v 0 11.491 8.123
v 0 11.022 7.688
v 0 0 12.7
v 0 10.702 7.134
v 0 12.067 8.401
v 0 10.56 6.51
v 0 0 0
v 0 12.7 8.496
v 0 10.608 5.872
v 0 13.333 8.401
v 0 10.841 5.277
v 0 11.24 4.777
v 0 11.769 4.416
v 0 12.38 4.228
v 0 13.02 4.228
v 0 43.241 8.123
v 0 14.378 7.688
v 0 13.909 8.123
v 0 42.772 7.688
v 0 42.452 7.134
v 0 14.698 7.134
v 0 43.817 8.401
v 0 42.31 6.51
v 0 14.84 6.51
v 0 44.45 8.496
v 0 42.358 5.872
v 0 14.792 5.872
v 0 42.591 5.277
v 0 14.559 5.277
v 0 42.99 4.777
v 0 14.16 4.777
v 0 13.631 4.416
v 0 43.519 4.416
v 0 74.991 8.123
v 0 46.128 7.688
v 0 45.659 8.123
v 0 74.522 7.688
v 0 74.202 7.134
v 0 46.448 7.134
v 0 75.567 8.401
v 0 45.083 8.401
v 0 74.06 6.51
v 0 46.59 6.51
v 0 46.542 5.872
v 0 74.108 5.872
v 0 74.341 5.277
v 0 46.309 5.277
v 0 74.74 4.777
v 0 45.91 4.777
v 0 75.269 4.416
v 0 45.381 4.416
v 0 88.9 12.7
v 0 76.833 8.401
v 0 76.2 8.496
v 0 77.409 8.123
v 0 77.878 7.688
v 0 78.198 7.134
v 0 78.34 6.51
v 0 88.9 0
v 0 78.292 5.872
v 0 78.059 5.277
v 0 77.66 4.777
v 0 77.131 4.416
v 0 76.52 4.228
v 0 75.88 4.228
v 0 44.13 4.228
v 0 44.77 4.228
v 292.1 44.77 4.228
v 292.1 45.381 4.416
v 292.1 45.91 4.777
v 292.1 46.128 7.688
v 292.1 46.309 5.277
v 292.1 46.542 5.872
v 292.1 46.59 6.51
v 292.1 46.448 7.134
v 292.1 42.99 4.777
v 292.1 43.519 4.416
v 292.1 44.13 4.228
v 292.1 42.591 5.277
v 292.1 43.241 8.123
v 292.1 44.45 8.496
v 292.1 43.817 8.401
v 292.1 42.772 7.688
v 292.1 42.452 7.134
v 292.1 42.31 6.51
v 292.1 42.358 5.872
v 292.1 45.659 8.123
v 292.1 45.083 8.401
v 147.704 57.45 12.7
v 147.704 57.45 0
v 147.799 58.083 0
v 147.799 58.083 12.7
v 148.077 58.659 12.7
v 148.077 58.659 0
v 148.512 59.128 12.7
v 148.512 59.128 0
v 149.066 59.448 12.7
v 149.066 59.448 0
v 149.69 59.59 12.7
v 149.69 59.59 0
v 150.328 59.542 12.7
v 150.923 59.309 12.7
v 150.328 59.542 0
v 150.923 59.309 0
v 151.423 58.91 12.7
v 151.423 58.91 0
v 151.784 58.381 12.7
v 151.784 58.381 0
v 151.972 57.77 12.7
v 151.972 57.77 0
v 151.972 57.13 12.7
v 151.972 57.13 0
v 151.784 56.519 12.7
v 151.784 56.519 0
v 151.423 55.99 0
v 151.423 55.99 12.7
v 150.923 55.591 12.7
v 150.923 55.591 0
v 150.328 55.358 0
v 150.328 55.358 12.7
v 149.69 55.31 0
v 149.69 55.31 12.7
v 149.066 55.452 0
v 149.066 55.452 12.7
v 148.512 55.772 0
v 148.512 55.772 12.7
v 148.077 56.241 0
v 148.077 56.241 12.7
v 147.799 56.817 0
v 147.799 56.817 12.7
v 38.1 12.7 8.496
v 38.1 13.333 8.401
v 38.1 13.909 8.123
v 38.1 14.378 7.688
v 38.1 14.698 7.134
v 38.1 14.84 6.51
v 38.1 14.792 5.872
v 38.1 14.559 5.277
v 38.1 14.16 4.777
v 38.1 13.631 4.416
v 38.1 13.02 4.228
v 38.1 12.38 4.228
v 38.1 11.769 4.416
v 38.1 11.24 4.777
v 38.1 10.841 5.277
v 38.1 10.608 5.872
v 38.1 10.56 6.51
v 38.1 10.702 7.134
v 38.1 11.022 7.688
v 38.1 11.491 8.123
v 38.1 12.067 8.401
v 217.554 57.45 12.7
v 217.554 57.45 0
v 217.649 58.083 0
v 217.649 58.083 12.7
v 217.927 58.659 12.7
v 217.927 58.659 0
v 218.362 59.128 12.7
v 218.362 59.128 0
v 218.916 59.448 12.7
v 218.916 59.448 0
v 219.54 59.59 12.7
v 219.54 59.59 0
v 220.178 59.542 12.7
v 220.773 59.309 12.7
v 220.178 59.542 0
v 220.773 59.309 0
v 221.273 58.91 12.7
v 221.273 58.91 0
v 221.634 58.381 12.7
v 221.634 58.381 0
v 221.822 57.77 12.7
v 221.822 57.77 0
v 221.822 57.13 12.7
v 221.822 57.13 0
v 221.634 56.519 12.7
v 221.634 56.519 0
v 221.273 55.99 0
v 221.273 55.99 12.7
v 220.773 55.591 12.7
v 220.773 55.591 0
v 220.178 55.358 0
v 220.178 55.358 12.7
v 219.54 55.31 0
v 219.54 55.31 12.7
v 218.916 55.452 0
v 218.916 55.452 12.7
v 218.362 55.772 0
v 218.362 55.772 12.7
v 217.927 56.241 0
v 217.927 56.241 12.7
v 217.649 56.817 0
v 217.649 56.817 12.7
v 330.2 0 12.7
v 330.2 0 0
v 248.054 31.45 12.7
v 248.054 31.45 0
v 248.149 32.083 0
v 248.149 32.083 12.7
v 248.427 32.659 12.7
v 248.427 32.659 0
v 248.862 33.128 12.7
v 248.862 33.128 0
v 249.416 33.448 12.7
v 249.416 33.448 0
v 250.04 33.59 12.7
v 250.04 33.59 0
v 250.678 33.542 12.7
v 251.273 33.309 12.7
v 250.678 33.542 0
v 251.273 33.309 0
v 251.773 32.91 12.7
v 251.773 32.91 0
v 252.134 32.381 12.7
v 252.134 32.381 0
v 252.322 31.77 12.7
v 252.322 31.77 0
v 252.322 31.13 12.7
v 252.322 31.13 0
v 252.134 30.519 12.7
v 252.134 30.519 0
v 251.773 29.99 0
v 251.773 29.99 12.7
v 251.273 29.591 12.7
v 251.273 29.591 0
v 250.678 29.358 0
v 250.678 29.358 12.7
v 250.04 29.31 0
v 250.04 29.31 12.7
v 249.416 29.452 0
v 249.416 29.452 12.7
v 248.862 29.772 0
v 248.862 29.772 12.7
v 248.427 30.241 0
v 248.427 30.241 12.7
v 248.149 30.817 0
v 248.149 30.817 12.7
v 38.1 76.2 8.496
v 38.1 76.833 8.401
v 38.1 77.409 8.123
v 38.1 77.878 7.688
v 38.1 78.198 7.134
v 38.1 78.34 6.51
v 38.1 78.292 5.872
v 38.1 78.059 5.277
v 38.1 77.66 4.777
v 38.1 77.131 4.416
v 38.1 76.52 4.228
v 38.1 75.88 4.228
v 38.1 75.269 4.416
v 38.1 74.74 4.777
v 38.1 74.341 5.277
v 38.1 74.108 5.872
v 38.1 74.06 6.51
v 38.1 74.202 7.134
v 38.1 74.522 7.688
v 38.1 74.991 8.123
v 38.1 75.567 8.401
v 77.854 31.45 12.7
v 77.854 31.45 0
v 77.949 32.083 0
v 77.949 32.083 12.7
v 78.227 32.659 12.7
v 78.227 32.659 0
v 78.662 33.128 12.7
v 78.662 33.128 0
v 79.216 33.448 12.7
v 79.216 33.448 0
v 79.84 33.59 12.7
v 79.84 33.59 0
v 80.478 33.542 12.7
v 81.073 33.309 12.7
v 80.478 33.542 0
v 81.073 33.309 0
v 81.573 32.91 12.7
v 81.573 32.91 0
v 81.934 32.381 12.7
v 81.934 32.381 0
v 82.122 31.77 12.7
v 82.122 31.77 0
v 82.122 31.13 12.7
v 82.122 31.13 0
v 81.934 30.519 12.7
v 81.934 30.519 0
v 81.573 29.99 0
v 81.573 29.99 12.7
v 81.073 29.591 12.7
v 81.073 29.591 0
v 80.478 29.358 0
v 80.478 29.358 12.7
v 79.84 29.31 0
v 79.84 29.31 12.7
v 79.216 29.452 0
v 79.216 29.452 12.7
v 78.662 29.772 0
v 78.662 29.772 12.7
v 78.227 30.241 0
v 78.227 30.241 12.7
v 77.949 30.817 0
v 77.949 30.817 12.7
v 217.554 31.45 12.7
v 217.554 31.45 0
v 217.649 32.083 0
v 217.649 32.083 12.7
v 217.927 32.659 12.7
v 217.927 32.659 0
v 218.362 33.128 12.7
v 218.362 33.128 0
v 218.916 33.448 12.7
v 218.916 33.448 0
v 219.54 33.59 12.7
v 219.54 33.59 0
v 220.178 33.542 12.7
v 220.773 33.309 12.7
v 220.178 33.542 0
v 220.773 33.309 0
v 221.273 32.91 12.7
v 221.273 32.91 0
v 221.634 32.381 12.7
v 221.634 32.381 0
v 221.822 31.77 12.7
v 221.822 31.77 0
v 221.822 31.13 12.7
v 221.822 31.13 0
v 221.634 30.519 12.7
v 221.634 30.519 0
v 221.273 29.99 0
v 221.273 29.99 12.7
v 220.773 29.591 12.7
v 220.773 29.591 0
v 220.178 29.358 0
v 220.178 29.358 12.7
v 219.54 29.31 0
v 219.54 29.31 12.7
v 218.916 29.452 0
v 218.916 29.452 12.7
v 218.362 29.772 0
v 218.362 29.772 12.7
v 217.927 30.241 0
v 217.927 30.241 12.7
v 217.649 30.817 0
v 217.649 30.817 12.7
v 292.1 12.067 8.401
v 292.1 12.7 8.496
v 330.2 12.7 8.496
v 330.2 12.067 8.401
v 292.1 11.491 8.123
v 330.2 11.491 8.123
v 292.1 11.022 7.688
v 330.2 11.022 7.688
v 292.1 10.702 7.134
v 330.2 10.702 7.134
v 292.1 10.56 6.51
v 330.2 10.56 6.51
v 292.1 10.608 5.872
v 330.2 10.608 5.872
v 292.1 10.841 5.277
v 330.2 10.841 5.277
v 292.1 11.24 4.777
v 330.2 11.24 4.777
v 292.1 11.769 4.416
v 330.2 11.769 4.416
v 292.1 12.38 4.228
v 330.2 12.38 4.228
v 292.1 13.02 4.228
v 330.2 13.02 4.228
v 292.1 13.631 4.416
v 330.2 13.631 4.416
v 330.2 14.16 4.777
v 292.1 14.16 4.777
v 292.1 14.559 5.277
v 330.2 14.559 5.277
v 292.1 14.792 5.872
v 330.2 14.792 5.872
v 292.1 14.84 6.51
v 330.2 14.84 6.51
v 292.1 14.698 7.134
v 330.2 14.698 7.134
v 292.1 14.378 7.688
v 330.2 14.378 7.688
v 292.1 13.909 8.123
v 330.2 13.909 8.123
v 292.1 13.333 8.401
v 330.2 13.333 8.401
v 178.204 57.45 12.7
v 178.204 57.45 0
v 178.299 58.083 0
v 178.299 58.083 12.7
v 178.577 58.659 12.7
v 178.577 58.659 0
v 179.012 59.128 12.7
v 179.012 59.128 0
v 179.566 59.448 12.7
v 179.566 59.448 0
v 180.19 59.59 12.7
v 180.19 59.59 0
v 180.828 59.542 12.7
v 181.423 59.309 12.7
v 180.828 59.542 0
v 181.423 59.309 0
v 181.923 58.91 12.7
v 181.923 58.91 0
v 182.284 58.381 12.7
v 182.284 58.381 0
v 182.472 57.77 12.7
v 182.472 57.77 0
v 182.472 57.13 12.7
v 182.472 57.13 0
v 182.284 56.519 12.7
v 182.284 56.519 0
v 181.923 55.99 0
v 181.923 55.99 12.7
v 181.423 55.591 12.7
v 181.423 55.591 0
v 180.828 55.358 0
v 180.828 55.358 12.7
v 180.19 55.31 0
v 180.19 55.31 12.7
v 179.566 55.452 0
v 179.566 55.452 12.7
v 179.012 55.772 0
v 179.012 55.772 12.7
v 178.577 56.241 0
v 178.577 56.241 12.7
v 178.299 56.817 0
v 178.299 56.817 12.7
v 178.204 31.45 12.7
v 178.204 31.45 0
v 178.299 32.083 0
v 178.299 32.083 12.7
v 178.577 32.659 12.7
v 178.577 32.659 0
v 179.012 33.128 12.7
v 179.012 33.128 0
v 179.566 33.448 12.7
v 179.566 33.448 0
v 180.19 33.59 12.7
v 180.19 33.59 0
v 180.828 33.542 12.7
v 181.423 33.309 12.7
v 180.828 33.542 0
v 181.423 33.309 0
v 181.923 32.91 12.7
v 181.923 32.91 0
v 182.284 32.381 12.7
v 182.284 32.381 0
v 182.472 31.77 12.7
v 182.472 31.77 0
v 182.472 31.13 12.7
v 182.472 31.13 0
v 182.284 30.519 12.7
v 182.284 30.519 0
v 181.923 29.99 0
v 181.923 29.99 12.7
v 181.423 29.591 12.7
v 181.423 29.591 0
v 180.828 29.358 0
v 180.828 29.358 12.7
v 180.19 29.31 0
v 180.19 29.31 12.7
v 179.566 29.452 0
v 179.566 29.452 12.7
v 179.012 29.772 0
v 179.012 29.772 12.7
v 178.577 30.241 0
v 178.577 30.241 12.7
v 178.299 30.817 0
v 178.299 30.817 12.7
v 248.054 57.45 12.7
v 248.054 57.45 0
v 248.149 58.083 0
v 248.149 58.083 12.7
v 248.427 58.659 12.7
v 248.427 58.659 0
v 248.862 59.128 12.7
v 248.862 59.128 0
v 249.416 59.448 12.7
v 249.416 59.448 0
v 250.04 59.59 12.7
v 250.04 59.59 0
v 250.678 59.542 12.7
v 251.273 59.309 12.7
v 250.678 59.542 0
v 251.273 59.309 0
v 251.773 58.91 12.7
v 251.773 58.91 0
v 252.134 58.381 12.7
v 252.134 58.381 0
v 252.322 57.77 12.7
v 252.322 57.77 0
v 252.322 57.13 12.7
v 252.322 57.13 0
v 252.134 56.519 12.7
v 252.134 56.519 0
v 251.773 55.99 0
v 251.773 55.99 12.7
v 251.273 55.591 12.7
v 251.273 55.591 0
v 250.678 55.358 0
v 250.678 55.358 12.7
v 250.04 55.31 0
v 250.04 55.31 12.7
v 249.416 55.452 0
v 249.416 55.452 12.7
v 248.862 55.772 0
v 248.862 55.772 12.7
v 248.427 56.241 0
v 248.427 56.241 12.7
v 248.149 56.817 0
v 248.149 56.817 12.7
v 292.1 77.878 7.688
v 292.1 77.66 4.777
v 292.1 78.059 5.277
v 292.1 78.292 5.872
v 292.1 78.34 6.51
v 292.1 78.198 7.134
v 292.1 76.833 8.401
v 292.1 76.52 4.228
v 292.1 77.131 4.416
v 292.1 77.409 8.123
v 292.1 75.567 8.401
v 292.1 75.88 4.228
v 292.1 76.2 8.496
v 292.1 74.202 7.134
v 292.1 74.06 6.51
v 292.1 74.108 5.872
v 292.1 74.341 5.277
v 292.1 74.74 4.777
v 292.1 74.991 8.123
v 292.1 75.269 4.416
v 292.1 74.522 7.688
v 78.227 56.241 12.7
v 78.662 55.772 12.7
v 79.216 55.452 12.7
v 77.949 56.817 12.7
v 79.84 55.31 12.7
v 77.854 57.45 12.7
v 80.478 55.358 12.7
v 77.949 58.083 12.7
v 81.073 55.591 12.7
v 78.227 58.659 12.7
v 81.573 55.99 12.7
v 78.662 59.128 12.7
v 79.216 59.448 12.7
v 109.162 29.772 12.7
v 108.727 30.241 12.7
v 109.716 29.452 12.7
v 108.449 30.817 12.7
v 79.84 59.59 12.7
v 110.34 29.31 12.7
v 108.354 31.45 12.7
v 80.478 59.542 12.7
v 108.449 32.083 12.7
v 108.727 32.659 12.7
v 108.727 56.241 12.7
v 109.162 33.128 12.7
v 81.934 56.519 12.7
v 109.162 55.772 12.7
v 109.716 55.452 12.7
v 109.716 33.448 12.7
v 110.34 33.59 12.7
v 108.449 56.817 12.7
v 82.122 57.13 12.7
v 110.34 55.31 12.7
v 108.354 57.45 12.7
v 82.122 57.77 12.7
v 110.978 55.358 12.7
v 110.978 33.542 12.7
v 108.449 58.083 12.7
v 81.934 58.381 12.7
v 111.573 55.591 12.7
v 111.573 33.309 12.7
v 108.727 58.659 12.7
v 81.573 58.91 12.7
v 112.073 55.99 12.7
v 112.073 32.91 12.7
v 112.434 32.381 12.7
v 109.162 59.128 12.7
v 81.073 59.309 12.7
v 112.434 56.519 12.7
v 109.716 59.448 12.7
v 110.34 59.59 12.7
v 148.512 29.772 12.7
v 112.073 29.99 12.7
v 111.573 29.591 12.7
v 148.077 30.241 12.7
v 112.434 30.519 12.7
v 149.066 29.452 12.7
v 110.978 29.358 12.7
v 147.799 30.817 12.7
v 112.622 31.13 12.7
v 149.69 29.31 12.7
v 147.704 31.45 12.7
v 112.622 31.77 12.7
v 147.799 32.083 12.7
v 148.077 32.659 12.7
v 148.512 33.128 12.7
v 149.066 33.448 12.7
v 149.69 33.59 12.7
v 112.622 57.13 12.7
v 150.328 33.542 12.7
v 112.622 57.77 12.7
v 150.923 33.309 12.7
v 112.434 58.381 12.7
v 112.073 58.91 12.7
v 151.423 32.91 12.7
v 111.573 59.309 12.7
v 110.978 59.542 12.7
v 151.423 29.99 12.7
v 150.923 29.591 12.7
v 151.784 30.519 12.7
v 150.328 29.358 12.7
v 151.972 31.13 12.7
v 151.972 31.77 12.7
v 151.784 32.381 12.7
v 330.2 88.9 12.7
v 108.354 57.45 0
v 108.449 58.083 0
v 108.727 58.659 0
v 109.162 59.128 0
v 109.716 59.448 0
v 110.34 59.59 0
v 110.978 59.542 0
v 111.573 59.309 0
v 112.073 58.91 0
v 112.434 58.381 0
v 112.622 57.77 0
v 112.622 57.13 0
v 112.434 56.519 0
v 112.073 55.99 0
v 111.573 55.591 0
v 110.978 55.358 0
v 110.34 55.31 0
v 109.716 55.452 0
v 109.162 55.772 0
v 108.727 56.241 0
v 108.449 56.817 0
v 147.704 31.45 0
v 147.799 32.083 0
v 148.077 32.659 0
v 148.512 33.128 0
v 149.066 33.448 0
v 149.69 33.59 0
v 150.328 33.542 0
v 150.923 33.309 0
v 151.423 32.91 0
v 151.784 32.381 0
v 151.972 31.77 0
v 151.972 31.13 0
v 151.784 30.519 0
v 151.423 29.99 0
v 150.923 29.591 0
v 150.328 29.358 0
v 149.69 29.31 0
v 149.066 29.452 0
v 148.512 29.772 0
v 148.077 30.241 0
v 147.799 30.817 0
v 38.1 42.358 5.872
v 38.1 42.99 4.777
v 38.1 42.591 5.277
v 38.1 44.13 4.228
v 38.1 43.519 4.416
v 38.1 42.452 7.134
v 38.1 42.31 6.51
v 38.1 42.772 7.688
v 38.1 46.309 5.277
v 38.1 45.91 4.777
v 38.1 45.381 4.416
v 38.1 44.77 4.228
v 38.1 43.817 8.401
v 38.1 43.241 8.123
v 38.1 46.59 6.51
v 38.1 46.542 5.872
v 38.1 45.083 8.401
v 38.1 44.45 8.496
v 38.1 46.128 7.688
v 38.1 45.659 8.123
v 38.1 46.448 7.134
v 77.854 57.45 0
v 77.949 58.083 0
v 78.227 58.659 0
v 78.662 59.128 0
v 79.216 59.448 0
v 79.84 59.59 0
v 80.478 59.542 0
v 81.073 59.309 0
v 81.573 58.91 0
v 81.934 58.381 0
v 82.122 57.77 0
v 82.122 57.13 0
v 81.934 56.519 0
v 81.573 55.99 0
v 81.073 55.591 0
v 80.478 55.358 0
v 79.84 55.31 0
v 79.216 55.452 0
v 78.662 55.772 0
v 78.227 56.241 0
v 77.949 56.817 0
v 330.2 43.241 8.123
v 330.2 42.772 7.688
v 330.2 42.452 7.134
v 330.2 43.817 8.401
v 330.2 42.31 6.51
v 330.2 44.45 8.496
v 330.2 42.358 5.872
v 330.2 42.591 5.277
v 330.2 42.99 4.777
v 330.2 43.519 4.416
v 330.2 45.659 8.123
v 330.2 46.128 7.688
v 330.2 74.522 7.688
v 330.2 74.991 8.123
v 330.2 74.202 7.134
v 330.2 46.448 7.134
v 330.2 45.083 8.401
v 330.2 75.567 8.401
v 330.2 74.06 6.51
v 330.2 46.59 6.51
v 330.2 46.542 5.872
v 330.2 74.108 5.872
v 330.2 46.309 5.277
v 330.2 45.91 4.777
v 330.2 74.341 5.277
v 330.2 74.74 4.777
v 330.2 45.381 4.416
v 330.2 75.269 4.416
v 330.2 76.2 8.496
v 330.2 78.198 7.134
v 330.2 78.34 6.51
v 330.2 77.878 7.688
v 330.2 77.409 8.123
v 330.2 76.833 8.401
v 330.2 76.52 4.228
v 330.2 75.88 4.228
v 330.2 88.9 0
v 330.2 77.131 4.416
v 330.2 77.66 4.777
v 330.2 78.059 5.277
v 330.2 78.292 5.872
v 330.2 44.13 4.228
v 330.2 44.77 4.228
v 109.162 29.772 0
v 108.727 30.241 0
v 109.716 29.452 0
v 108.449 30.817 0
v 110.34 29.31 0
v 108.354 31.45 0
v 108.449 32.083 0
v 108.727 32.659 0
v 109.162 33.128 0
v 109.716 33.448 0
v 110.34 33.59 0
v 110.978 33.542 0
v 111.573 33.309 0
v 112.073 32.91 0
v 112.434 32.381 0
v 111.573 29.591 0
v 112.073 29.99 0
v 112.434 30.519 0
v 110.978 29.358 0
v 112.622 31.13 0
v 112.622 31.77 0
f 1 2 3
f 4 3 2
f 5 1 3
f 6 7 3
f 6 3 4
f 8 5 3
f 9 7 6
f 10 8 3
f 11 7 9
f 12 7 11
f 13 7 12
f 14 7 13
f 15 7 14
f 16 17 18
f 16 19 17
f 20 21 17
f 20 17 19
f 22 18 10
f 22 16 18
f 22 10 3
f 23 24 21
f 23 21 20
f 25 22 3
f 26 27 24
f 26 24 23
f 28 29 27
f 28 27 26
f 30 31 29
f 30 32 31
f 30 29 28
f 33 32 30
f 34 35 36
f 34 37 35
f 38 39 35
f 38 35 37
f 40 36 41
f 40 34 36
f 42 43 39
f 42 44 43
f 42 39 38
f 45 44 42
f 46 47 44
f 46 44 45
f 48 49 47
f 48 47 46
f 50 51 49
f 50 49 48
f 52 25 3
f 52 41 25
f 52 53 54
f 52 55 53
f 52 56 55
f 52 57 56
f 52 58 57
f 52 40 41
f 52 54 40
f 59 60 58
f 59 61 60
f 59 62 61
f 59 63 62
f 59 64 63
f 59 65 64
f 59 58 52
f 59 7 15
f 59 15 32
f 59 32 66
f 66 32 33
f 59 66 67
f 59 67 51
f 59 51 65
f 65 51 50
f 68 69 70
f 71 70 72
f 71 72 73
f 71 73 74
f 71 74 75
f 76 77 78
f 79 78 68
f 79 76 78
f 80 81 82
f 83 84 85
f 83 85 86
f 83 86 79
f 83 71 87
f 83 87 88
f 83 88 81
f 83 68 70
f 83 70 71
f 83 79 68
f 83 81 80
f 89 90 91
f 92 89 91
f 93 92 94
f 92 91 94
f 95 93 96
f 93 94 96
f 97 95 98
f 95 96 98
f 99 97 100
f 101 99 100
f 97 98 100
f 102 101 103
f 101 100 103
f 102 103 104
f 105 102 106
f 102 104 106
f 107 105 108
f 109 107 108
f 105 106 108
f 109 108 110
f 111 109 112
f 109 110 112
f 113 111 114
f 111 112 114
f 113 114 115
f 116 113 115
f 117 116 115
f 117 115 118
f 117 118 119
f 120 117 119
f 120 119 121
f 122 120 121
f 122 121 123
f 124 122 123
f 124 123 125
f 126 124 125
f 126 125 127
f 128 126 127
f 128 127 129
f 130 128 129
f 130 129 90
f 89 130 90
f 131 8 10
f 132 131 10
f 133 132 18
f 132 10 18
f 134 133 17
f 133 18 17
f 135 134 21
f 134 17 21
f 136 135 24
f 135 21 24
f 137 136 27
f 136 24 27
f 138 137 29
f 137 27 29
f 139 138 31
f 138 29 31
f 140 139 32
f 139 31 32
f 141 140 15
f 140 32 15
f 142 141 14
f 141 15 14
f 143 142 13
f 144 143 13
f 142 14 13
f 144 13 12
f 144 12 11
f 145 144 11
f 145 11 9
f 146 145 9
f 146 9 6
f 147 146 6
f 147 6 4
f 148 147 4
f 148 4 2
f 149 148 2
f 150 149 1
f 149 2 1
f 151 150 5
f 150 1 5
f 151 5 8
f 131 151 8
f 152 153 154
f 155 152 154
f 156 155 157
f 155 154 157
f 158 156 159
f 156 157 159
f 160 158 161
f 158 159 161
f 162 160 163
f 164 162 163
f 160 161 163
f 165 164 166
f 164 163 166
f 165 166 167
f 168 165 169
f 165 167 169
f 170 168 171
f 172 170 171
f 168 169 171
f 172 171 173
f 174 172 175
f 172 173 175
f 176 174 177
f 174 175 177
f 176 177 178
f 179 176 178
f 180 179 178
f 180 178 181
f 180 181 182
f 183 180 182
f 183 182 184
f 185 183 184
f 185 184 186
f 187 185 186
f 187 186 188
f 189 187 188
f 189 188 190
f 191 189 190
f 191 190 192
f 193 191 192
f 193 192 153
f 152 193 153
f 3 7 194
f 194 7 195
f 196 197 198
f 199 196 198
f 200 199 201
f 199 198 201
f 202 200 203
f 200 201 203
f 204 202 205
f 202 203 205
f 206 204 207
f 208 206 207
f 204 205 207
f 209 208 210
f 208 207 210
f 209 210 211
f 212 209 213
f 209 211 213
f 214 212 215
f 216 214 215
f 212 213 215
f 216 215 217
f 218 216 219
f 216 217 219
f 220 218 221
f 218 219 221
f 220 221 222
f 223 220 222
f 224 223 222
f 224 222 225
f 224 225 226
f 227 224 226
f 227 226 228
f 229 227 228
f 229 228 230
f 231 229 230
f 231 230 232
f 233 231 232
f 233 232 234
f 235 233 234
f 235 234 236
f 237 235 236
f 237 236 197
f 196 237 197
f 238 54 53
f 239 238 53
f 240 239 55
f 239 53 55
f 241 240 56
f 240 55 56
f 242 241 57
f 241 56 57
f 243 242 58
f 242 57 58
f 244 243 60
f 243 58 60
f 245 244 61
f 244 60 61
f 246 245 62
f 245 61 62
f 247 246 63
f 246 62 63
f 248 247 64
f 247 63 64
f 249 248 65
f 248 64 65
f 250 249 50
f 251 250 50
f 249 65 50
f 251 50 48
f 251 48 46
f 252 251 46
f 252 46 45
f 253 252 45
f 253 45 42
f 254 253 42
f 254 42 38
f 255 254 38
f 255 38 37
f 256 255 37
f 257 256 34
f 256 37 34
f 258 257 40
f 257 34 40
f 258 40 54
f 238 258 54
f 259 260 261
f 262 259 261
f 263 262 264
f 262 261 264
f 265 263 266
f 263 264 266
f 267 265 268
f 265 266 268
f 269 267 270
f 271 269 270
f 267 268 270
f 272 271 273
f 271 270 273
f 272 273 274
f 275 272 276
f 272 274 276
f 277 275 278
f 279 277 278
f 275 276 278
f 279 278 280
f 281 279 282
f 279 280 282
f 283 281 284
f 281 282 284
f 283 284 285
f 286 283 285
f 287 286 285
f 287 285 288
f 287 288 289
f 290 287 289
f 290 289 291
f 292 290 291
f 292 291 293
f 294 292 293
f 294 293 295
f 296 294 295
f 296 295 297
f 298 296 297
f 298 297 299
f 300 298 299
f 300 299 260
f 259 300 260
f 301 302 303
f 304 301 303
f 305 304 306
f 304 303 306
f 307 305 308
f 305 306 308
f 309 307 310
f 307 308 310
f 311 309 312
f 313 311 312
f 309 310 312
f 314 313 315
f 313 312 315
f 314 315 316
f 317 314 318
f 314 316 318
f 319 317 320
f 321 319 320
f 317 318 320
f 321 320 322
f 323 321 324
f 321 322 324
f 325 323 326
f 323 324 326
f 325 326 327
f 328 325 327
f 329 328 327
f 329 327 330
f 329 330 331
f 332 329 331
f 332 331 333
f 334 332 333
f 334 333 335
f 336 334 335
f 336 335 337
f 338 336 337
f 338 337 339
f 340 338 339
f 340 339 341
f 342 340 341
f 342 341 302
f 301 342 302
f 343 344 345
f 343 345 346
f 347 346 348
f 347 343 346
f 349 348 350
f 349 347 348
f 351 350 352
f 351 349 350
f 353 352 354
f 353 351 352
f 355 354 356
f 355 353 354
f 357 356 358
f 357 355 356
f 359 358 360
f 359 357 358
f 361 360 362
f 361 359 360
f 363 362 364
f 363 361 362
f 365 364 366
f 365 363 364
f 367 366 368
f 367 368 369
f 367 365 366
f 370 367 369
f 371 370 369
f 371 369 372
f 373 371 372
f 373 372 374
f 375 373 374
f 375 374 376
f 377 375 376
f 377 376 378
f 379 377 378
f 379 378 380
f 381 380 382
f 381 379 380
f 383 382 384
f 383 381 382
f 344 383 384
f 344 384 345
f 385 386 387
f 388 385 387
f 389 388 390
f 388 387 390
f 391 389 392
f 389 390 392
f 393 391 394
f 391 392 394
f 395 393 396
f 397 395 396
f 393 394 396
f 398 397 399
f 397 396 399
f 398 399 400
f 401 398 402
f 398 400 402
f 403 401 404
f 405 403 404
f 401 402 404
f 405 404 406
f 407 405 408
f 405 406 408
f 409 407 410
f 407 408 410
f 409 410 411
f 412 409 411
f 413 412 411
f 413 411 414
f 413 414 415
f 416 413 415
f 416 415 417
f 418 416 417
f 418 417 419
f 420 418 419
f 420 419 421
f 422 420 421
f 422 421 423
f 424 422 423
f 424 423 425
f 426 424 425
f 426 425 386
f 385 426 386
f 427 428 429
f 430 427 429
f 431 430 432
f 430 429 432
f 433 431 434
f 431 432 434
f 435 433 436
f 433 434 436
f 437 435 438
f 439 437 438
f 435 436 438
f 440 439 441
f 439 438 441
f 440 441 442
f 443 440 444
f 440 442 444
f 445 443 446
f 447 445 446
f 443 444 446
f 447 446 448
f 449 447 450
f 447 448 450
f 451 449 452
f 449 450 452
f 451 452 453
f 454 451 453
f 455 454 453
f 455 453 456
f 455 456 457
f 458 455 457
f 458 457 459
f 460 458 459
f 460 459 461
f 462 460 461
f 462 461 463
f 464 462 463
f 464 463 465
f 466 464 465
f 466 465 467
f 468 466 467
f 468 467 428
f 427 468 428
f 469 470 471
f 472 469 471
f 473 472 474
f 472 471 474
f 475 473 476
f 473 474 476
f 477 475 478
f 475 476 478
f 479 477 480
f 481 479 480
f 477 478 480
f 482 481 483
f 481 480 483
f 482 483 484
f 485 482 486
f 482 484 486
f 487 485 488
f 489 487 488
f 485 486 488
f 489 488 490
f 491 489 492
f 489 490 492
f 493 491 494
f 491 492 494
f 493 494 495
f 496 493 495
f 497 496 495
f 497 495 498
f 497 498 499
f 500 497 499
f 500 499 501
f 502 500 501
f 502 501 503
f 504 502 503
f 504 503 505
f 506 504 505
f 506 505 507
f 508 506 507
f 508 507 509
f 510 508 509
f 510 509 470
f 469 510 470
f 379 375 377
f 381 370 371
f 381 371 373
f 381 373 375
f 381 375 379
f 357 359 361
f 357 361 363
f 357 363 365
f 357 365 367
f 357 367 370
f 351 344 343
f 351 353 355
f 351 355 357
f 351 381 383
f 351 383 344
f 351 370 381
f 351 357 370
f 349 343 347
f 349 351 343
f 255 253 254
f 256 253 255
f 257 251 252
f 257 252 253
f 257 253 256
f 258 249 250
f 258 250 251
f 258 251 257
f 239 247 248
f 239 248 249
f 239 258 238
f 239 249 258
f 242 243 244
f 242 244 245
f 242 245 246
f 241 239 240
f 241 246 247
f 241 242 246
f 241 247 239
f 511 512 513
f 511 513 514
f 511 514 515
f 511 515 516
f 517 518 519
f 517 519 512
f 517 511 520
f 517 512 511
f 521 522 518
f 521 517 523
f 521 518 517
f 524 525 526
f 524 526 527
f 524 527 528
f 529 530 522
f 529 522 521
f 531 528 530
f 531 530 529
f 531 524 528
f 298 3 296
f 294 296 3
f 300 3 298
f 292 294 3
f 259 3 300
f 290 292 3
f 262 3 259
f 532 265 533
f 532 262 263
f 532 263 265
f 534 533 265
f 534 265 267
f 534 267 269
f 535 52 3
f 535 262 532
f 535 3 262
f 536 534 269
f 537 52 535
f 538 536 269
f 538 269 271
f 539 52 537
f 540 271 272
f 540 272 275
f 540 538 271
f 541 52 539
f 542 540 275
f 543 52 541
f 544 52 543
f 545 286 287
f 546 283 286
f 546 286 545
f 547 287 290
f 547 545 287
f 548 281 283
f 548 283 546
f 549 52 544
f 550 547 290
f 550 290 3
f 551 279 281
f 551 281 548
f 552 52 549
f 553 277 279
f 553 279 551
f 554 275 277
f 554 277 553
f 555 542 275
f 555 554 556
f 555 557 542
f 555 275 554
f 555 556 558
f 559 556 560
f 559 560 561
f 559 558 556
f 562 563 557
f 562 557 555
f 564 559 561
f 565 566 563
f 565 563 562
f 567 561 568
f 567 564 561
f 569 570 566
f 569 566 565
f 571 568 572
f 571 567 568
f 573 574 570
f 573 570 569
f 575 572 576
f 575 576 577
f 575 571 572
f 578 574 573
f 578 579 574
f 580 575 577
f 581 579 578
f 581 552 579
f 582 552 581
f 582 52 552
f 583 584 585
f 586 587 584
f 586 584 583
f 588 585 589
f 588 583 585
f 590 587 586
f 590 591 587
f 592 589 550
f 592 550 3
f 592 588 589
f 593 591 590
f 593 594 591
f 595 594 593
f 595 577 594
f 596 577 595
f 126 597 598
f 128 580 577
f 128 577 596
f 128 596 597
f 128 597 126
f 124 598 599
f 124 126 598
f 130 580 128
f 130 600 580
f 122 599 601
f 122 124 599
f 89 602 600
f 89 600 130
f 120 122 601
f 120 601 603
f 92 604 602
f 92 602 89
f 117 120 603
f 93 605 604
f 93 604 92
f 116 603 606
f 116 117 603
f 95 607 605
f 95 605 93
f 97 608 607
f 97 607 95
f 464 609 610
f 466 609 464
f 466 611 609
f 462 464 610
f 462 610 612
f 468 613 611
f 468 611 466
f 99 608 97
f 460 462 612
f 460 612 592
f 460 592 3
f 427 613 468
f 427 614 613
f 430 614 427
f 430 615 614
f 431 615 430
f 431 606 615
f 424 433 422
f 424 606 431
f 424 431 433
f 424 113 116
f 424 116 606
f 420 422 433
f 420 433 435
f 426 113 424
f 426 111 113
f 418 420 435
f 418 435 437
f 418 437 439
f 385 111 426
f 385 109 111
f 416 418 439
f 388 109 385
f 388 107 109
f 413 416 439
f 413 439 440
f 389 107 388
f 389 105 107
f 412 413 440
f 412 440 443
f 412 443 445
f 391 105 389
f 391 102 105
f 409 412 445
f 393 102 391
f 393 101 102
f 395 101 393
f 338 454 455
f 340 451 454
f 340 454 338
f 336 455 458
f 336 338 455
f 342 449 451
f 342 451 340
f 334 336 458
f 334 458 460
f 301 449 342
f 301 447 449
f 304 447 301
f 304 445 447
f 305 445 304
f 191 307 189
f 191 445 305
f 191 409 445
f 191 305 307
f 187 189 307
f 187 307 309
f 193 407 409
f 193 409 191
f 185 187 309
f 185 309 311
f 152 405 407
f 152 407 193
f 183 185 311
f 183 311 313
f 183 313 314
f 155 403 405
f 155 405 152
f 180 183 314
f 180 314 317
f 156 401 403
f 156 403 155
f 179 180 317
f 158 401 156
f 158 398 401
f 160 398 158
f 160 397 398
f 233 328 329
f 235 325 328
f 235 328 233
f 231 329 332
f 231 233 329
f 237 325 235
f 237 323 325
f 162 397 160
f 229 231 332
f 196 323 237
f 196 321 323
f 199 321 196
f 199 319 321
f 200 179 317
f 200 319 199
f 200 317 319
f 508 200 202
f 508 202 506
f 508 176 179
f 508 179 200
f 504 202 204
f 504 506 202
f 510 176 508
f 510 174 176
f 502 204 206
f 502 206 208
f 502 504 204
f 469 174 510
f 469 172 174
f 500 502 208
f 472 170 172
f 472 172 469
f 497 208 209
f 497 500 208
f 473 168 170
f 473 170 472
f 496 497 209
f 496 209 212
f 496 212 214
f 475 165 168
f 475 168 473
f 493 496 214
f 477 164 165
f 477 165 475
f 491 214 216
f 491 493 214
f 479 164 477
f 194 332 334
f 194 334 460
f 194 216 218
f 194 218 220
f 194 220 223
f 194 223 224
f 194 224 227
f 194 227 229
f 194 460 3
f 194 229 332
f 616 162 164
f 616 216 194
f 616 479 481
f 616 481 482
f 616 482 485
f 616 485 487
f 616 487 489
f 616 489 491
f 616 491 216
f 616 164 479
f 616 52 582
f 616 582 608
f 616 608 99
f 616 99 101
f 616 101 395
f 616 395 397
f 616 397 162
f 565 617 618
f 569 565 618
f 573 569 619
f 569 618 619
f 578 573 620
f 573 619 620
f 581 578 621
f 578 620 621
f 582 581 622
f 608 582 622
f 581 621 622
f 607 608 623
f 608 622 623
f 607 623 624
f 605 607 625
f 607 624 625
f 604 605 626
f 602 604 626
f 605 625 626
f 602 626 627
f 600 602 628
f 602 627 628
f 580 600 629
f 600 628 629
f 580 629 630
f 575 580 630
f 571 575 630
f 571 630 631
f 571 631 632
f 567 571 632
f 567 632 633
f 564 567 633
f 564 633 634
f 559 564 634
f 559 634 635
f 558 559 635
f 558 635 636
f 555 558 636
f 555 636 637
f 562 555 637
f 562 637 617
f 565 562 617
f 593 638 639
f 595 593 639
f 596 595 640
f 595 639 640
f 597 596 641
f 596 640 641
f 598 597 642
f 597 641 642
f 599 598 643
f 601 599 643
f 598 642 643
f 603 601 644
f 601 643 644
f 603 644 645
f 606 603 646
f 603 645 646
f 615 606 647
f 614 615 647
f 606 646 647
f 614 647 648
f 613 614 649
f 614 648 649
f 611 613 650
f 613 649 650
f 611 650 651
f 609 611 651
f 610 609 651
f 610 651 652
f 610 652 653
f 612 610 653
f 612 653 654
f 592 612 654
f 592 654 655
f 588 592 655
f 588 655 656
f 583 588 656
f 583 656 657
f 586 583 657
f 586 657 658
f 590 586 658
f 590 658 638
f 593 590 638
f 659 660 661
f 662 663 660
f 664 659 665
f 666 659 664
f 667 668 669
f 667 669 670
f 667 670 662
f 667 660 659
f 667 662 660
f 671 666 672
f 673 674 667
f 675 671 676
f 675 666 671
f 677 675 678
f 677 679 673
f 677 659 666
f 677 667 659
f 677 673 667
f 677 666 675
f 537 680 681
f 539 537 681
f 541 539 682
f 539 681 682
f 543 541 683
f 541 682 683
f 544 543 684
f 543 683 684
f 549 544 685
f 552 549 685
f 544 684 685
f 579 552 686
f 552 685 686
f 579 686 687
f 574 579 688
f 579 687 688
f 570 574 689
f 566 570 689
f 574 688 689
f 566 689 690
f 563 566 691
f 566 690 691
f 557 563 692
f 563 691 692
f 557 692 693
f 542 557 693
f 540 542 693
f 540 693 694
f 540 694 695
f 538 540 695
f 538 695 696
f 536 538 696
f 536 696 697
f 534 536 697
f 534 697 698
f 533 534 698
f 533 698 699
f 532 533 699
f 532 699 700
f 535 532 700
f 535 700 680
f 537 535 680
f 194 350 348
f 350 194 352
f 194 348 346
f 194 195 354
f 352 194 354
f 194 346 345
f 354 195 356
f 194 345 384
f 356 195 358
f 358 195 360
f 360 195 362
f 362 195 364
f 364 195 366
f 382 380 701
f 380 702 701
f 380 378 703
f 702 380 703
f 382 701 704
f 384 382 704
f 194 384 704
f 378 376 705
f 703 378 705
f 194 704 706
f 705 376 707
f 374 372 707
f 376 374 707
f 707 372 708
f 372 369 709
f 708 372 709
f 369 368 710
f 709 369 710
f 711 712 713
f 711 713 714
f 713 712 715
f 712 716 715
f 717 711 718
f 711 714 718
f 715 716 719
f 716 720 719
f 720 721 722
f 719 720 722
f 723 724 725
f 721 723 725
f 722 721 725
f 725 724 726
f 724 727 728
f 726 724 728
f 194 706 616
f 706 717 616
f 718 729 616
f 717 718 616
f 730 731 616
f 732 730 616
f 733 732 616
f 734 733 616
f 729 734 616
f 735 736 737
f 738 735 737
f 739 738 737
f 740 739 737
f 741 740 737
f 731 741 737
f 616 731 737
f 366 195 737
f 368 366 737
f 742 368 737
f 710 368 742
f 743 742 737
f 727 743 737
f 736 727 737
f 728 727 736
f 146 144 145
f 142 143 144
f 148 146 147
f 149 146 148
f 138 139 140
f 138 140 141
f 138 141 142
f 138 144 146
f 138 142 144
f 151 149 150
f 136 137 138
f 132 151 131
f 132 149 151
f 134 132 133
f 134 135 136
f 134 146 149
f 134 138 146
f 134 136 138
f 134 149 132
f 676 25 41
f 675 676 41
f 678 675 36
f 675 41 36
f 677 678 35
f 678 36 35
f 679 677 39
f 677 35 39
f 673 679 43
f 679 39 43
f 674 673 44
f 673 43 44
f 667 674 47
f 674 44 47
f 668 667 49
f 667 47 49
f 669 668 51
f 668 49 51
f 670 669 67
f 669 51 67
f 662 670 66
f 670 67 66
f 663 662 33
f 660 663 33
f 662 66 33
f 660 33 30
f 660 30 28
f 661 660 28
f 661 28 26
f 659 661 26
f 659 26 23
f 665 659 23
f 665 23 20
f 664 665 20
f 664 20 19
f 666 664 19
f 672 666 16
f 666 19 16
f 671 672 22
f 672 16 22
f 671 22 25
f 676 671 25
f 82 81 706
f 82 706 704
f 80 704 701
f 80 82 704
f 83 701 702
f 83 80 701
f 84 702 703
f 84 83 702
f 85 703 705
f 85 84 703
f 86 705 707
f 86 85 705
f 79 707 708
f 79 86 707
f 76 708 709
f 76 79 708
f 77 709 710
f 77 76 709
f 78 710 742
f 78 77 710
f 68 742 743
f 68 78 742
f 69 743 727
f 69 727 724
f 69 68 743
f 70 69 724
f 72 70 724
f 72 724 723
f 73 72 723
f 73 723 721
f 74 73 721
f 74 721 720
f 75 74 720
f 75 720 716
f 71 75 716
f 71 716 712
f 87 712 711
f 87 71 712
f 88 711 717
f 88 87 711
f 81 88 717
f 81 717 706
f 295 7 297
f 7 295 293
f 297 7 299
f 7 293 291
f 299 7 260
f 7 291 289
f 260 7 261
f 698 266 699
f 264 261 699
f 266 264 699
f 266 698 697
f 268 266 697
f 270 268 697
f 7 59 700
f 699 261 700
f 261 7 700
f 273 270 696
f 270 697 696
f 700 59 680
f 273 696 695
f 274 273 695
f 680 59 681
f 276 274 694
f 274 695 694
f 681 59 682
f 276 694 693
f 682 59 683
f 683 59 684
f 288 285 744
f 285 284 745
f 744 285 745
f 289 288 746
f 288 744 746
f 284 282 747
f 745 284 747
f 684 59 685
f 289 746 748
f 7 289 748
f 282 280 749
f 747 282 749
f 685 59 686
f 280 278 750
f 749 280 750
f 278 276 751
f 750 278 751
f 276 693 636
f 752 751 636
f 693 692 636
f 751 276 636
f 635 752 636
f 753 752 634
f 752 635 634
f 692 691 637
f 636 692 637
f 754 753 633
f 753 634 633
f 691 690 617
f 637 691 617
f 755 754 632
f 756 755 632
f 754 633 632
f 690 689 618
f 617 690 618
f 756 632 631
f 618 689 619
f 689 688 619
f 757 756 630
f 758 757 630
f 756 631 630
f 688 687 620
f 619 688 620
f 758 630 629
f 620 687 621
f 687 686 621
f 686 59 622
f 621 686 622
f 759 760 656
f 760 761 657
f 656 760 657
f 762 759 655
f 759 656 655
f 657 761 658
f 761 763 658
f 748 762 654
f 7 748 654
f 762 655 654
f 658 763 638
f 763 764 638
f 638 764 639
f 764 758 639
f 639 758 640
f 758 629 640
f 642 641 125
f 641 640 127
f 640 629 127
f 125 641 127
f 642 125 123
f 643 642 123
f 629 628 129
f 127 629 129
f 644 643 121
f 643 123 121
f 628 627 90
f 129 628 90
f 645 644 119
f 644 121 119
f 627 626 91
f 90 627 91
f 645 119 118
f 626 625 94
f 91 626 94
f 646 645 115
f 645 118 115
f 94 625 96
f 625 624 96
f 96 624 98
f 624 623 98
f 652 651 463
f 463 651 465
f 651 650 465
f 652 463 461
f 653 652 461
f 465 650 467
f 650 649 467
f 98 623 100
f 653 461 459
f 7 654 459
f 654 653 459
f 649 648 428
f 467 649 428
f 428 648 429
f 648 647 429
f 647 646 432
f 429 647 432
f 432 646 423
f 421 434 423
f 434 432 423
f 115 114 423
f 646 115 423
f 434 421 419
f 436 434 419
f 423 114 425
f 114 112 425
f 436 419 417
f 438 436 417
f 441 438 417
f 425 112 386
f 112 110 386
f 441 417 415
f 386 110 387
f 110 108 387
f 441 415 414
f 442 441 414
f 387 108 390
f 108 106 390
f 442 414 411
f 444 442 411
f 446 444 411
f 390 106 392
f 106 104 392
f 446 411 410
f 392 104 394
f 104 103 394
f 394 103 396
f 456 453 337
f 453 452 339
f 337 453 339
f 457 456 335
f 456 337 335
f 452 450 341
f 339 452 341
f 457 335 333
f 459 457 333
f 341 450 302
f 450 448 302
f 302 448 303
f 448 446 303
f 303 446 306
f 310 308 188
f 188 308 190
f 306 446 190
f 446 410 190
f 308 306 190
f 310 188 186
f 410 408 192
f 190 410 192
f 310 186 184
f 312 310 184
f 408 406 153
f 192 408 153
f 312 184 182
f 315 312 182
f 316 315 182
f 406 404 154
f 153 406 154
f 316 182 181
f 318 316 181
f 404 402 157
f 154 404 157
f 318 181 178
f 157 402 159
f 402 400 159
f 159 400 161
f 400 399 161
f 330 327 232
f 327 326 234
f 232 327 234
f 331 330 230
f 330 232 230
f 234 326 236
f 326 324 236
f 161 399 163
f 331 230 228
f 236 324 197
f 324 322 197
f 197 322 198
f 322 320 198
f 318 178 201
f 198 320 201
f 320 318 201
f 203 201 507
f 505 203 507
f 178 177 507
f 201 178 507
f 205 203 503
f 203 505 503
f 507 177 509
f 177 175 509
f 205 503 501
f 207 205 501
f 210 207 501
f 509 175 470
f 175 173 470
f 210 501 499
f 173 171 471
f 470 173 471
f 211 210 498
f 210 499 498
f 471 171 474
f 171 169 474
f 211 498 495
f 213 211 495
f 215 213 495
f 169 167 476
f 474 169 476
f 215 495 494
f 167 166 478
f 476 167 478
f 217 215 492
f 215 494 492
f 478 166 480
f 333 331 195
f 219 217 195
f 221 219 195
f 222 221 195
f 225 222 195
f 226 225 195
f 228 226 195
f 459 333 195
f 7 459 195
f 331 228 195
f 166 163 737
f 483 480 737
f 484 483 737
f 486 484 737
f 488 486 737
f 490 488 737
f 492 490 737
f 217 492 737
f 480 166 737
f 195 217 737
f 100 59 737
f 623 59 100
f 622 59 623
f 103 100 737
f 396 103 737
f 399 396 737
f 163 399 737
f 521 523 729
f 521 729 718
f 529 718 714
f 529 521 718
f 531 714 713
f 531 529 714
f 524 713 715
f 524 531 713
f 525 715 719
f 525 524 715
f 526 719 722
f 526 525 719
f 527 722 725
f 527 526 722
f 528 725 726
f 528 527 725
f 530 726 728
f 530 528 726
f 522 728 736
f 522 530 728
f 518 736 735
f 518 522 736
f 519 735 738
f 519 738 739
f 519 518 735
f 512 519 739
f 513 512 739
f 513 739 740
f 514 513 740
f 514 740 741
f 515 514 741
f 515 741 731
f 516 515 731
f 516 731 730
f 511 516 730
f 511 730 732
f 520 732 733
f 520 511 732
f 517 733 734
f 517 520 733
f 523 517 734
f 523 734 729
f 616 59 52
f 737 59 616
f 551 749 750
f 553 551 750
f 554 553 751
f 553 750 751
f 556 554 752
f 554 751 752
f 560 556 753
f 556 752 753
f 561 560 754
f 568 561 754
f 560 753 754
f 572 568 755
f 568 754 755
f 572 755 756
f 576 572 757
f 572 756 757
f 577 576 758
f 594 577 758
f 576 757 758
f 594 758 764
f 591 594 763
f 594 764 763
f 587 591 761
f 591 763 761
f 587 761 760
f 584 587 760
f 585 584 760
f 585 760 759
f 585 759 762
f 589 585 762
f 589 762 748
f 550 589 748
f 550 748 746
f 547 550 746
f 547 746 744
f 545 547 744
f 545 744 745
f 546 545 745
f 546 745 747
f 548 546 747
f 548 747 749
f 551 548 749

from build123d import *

# Parameters (mm, degrees)
SKETCH1_W           = 330.2
SKETCH1_H           = 88.9
BOSS_EXTRUDE1_DEPTH = 12.7
SKETCH3_R           = 2.1463
CUT_EXTRUDE1_DEPTH  = 38.1
CUT_EXTRUDE2_START  = -38.1
SKETCH5_R           = 2.1463
CUT_EXTRUDE2_DEPTH  = 38.1
SKETCH6_R           = 2.1463
CUT_EXTRUDE3_DEPTH  = 343.193717067


with BuildPart() as part:
    # Sketch1 → Boss-Extrude1 (new body)
    with BuildSketch(Plane.XY):
        with Locations((165.1, 44.45)):
            Rectangle(SKETCH1_W, SKETCH1_H)
    extrude(amount=BOSS_EXTRUDE1_DEPTH)

    # Sketch3 → Cut-Extrude1 (cut)
    with BuildSketch(Plane.ZY):
        with Locations((6.35, 76.2)):
            Circle(SKETCH3_R)
        with Locations((6.35, 12.7)):
            Circle(SKETCH3_R)
        with Locations((6.35, 44.45)):
            Circle(SKETCH3_R)
    extrude(amount=-CUT_EXTRUDE1_DEPTH, mode=Mode.SUBTRACT)

    # Sketch5 → Cut-Extrude2 (cut)
    with BuildSketch(Plane(origin=(330.2, 0, 0), x_dir=(0, 0, -1), z_dir=(1, 0, 0)).offset(CUT_EXTRUDE2_START)):
        with Locations(Location((-6.35, 76.2, 0), (0, 0, 180))):
            Circle(SKETCH5_R)
        with Locations(Location((-6.35, 12.7, 0), (0, 0, 180))):
            Circle(SKETCH5_R)
        with Locations(Location((-6.35, 44.45, 0), (0, 0, 180))):
            Circle(SKETCH5_R)
    extrude(amount=CUT_EXTRUDE2_DEPTH, mode=Mode.SUBTRACT)

    # Sketch6 → Cut-Extrude3 (cut, through all)
    with BuildSketch(Plane(origin=(0, 0, 0), x_dir=(-1, 0, 0), z_dir=(0, 0, -1))):
        with Locations((-250.2, 57.45)):
            Circle(SKETCH6_R)
        with Locations((-219.7, 57.45)):
            Circle(SKETCH6_R)
        with Locations((-219.7, 31.45)):
            Circle(SKETCH6_R)
        with Locations((-250.2, 31.45)):
            Circle(SKETCH6_R)
        with Locations((-180.35, 57.45)):
            Circle(SKETCH6_R)
        with Locations((-149.85, 57.45)):
            Circle(SKETCH6_R)
        with Locations((-149.85, 31.45)):
            Circle(SKETCH6_R)
        with Locations((-180.35, 31.45)):
            Circle(SKETCH6_R)
        with Locations((-110.5, 31.45)):
            Circle(SKETCH6_R)
        with Locations((-110.5, 57.45)):
            Circle(SKETCH6_R)
        with Locations((-80, 57.45)):
            Circle(SKETCH6_R)
        with Locations((-80, 31.45)):
            Circle(SKETCH6_R)
    extrude(amount=-CUT_EXTRUDE3_DEPTH, mode=Mode.SUBTRACT)


solid = part.part
